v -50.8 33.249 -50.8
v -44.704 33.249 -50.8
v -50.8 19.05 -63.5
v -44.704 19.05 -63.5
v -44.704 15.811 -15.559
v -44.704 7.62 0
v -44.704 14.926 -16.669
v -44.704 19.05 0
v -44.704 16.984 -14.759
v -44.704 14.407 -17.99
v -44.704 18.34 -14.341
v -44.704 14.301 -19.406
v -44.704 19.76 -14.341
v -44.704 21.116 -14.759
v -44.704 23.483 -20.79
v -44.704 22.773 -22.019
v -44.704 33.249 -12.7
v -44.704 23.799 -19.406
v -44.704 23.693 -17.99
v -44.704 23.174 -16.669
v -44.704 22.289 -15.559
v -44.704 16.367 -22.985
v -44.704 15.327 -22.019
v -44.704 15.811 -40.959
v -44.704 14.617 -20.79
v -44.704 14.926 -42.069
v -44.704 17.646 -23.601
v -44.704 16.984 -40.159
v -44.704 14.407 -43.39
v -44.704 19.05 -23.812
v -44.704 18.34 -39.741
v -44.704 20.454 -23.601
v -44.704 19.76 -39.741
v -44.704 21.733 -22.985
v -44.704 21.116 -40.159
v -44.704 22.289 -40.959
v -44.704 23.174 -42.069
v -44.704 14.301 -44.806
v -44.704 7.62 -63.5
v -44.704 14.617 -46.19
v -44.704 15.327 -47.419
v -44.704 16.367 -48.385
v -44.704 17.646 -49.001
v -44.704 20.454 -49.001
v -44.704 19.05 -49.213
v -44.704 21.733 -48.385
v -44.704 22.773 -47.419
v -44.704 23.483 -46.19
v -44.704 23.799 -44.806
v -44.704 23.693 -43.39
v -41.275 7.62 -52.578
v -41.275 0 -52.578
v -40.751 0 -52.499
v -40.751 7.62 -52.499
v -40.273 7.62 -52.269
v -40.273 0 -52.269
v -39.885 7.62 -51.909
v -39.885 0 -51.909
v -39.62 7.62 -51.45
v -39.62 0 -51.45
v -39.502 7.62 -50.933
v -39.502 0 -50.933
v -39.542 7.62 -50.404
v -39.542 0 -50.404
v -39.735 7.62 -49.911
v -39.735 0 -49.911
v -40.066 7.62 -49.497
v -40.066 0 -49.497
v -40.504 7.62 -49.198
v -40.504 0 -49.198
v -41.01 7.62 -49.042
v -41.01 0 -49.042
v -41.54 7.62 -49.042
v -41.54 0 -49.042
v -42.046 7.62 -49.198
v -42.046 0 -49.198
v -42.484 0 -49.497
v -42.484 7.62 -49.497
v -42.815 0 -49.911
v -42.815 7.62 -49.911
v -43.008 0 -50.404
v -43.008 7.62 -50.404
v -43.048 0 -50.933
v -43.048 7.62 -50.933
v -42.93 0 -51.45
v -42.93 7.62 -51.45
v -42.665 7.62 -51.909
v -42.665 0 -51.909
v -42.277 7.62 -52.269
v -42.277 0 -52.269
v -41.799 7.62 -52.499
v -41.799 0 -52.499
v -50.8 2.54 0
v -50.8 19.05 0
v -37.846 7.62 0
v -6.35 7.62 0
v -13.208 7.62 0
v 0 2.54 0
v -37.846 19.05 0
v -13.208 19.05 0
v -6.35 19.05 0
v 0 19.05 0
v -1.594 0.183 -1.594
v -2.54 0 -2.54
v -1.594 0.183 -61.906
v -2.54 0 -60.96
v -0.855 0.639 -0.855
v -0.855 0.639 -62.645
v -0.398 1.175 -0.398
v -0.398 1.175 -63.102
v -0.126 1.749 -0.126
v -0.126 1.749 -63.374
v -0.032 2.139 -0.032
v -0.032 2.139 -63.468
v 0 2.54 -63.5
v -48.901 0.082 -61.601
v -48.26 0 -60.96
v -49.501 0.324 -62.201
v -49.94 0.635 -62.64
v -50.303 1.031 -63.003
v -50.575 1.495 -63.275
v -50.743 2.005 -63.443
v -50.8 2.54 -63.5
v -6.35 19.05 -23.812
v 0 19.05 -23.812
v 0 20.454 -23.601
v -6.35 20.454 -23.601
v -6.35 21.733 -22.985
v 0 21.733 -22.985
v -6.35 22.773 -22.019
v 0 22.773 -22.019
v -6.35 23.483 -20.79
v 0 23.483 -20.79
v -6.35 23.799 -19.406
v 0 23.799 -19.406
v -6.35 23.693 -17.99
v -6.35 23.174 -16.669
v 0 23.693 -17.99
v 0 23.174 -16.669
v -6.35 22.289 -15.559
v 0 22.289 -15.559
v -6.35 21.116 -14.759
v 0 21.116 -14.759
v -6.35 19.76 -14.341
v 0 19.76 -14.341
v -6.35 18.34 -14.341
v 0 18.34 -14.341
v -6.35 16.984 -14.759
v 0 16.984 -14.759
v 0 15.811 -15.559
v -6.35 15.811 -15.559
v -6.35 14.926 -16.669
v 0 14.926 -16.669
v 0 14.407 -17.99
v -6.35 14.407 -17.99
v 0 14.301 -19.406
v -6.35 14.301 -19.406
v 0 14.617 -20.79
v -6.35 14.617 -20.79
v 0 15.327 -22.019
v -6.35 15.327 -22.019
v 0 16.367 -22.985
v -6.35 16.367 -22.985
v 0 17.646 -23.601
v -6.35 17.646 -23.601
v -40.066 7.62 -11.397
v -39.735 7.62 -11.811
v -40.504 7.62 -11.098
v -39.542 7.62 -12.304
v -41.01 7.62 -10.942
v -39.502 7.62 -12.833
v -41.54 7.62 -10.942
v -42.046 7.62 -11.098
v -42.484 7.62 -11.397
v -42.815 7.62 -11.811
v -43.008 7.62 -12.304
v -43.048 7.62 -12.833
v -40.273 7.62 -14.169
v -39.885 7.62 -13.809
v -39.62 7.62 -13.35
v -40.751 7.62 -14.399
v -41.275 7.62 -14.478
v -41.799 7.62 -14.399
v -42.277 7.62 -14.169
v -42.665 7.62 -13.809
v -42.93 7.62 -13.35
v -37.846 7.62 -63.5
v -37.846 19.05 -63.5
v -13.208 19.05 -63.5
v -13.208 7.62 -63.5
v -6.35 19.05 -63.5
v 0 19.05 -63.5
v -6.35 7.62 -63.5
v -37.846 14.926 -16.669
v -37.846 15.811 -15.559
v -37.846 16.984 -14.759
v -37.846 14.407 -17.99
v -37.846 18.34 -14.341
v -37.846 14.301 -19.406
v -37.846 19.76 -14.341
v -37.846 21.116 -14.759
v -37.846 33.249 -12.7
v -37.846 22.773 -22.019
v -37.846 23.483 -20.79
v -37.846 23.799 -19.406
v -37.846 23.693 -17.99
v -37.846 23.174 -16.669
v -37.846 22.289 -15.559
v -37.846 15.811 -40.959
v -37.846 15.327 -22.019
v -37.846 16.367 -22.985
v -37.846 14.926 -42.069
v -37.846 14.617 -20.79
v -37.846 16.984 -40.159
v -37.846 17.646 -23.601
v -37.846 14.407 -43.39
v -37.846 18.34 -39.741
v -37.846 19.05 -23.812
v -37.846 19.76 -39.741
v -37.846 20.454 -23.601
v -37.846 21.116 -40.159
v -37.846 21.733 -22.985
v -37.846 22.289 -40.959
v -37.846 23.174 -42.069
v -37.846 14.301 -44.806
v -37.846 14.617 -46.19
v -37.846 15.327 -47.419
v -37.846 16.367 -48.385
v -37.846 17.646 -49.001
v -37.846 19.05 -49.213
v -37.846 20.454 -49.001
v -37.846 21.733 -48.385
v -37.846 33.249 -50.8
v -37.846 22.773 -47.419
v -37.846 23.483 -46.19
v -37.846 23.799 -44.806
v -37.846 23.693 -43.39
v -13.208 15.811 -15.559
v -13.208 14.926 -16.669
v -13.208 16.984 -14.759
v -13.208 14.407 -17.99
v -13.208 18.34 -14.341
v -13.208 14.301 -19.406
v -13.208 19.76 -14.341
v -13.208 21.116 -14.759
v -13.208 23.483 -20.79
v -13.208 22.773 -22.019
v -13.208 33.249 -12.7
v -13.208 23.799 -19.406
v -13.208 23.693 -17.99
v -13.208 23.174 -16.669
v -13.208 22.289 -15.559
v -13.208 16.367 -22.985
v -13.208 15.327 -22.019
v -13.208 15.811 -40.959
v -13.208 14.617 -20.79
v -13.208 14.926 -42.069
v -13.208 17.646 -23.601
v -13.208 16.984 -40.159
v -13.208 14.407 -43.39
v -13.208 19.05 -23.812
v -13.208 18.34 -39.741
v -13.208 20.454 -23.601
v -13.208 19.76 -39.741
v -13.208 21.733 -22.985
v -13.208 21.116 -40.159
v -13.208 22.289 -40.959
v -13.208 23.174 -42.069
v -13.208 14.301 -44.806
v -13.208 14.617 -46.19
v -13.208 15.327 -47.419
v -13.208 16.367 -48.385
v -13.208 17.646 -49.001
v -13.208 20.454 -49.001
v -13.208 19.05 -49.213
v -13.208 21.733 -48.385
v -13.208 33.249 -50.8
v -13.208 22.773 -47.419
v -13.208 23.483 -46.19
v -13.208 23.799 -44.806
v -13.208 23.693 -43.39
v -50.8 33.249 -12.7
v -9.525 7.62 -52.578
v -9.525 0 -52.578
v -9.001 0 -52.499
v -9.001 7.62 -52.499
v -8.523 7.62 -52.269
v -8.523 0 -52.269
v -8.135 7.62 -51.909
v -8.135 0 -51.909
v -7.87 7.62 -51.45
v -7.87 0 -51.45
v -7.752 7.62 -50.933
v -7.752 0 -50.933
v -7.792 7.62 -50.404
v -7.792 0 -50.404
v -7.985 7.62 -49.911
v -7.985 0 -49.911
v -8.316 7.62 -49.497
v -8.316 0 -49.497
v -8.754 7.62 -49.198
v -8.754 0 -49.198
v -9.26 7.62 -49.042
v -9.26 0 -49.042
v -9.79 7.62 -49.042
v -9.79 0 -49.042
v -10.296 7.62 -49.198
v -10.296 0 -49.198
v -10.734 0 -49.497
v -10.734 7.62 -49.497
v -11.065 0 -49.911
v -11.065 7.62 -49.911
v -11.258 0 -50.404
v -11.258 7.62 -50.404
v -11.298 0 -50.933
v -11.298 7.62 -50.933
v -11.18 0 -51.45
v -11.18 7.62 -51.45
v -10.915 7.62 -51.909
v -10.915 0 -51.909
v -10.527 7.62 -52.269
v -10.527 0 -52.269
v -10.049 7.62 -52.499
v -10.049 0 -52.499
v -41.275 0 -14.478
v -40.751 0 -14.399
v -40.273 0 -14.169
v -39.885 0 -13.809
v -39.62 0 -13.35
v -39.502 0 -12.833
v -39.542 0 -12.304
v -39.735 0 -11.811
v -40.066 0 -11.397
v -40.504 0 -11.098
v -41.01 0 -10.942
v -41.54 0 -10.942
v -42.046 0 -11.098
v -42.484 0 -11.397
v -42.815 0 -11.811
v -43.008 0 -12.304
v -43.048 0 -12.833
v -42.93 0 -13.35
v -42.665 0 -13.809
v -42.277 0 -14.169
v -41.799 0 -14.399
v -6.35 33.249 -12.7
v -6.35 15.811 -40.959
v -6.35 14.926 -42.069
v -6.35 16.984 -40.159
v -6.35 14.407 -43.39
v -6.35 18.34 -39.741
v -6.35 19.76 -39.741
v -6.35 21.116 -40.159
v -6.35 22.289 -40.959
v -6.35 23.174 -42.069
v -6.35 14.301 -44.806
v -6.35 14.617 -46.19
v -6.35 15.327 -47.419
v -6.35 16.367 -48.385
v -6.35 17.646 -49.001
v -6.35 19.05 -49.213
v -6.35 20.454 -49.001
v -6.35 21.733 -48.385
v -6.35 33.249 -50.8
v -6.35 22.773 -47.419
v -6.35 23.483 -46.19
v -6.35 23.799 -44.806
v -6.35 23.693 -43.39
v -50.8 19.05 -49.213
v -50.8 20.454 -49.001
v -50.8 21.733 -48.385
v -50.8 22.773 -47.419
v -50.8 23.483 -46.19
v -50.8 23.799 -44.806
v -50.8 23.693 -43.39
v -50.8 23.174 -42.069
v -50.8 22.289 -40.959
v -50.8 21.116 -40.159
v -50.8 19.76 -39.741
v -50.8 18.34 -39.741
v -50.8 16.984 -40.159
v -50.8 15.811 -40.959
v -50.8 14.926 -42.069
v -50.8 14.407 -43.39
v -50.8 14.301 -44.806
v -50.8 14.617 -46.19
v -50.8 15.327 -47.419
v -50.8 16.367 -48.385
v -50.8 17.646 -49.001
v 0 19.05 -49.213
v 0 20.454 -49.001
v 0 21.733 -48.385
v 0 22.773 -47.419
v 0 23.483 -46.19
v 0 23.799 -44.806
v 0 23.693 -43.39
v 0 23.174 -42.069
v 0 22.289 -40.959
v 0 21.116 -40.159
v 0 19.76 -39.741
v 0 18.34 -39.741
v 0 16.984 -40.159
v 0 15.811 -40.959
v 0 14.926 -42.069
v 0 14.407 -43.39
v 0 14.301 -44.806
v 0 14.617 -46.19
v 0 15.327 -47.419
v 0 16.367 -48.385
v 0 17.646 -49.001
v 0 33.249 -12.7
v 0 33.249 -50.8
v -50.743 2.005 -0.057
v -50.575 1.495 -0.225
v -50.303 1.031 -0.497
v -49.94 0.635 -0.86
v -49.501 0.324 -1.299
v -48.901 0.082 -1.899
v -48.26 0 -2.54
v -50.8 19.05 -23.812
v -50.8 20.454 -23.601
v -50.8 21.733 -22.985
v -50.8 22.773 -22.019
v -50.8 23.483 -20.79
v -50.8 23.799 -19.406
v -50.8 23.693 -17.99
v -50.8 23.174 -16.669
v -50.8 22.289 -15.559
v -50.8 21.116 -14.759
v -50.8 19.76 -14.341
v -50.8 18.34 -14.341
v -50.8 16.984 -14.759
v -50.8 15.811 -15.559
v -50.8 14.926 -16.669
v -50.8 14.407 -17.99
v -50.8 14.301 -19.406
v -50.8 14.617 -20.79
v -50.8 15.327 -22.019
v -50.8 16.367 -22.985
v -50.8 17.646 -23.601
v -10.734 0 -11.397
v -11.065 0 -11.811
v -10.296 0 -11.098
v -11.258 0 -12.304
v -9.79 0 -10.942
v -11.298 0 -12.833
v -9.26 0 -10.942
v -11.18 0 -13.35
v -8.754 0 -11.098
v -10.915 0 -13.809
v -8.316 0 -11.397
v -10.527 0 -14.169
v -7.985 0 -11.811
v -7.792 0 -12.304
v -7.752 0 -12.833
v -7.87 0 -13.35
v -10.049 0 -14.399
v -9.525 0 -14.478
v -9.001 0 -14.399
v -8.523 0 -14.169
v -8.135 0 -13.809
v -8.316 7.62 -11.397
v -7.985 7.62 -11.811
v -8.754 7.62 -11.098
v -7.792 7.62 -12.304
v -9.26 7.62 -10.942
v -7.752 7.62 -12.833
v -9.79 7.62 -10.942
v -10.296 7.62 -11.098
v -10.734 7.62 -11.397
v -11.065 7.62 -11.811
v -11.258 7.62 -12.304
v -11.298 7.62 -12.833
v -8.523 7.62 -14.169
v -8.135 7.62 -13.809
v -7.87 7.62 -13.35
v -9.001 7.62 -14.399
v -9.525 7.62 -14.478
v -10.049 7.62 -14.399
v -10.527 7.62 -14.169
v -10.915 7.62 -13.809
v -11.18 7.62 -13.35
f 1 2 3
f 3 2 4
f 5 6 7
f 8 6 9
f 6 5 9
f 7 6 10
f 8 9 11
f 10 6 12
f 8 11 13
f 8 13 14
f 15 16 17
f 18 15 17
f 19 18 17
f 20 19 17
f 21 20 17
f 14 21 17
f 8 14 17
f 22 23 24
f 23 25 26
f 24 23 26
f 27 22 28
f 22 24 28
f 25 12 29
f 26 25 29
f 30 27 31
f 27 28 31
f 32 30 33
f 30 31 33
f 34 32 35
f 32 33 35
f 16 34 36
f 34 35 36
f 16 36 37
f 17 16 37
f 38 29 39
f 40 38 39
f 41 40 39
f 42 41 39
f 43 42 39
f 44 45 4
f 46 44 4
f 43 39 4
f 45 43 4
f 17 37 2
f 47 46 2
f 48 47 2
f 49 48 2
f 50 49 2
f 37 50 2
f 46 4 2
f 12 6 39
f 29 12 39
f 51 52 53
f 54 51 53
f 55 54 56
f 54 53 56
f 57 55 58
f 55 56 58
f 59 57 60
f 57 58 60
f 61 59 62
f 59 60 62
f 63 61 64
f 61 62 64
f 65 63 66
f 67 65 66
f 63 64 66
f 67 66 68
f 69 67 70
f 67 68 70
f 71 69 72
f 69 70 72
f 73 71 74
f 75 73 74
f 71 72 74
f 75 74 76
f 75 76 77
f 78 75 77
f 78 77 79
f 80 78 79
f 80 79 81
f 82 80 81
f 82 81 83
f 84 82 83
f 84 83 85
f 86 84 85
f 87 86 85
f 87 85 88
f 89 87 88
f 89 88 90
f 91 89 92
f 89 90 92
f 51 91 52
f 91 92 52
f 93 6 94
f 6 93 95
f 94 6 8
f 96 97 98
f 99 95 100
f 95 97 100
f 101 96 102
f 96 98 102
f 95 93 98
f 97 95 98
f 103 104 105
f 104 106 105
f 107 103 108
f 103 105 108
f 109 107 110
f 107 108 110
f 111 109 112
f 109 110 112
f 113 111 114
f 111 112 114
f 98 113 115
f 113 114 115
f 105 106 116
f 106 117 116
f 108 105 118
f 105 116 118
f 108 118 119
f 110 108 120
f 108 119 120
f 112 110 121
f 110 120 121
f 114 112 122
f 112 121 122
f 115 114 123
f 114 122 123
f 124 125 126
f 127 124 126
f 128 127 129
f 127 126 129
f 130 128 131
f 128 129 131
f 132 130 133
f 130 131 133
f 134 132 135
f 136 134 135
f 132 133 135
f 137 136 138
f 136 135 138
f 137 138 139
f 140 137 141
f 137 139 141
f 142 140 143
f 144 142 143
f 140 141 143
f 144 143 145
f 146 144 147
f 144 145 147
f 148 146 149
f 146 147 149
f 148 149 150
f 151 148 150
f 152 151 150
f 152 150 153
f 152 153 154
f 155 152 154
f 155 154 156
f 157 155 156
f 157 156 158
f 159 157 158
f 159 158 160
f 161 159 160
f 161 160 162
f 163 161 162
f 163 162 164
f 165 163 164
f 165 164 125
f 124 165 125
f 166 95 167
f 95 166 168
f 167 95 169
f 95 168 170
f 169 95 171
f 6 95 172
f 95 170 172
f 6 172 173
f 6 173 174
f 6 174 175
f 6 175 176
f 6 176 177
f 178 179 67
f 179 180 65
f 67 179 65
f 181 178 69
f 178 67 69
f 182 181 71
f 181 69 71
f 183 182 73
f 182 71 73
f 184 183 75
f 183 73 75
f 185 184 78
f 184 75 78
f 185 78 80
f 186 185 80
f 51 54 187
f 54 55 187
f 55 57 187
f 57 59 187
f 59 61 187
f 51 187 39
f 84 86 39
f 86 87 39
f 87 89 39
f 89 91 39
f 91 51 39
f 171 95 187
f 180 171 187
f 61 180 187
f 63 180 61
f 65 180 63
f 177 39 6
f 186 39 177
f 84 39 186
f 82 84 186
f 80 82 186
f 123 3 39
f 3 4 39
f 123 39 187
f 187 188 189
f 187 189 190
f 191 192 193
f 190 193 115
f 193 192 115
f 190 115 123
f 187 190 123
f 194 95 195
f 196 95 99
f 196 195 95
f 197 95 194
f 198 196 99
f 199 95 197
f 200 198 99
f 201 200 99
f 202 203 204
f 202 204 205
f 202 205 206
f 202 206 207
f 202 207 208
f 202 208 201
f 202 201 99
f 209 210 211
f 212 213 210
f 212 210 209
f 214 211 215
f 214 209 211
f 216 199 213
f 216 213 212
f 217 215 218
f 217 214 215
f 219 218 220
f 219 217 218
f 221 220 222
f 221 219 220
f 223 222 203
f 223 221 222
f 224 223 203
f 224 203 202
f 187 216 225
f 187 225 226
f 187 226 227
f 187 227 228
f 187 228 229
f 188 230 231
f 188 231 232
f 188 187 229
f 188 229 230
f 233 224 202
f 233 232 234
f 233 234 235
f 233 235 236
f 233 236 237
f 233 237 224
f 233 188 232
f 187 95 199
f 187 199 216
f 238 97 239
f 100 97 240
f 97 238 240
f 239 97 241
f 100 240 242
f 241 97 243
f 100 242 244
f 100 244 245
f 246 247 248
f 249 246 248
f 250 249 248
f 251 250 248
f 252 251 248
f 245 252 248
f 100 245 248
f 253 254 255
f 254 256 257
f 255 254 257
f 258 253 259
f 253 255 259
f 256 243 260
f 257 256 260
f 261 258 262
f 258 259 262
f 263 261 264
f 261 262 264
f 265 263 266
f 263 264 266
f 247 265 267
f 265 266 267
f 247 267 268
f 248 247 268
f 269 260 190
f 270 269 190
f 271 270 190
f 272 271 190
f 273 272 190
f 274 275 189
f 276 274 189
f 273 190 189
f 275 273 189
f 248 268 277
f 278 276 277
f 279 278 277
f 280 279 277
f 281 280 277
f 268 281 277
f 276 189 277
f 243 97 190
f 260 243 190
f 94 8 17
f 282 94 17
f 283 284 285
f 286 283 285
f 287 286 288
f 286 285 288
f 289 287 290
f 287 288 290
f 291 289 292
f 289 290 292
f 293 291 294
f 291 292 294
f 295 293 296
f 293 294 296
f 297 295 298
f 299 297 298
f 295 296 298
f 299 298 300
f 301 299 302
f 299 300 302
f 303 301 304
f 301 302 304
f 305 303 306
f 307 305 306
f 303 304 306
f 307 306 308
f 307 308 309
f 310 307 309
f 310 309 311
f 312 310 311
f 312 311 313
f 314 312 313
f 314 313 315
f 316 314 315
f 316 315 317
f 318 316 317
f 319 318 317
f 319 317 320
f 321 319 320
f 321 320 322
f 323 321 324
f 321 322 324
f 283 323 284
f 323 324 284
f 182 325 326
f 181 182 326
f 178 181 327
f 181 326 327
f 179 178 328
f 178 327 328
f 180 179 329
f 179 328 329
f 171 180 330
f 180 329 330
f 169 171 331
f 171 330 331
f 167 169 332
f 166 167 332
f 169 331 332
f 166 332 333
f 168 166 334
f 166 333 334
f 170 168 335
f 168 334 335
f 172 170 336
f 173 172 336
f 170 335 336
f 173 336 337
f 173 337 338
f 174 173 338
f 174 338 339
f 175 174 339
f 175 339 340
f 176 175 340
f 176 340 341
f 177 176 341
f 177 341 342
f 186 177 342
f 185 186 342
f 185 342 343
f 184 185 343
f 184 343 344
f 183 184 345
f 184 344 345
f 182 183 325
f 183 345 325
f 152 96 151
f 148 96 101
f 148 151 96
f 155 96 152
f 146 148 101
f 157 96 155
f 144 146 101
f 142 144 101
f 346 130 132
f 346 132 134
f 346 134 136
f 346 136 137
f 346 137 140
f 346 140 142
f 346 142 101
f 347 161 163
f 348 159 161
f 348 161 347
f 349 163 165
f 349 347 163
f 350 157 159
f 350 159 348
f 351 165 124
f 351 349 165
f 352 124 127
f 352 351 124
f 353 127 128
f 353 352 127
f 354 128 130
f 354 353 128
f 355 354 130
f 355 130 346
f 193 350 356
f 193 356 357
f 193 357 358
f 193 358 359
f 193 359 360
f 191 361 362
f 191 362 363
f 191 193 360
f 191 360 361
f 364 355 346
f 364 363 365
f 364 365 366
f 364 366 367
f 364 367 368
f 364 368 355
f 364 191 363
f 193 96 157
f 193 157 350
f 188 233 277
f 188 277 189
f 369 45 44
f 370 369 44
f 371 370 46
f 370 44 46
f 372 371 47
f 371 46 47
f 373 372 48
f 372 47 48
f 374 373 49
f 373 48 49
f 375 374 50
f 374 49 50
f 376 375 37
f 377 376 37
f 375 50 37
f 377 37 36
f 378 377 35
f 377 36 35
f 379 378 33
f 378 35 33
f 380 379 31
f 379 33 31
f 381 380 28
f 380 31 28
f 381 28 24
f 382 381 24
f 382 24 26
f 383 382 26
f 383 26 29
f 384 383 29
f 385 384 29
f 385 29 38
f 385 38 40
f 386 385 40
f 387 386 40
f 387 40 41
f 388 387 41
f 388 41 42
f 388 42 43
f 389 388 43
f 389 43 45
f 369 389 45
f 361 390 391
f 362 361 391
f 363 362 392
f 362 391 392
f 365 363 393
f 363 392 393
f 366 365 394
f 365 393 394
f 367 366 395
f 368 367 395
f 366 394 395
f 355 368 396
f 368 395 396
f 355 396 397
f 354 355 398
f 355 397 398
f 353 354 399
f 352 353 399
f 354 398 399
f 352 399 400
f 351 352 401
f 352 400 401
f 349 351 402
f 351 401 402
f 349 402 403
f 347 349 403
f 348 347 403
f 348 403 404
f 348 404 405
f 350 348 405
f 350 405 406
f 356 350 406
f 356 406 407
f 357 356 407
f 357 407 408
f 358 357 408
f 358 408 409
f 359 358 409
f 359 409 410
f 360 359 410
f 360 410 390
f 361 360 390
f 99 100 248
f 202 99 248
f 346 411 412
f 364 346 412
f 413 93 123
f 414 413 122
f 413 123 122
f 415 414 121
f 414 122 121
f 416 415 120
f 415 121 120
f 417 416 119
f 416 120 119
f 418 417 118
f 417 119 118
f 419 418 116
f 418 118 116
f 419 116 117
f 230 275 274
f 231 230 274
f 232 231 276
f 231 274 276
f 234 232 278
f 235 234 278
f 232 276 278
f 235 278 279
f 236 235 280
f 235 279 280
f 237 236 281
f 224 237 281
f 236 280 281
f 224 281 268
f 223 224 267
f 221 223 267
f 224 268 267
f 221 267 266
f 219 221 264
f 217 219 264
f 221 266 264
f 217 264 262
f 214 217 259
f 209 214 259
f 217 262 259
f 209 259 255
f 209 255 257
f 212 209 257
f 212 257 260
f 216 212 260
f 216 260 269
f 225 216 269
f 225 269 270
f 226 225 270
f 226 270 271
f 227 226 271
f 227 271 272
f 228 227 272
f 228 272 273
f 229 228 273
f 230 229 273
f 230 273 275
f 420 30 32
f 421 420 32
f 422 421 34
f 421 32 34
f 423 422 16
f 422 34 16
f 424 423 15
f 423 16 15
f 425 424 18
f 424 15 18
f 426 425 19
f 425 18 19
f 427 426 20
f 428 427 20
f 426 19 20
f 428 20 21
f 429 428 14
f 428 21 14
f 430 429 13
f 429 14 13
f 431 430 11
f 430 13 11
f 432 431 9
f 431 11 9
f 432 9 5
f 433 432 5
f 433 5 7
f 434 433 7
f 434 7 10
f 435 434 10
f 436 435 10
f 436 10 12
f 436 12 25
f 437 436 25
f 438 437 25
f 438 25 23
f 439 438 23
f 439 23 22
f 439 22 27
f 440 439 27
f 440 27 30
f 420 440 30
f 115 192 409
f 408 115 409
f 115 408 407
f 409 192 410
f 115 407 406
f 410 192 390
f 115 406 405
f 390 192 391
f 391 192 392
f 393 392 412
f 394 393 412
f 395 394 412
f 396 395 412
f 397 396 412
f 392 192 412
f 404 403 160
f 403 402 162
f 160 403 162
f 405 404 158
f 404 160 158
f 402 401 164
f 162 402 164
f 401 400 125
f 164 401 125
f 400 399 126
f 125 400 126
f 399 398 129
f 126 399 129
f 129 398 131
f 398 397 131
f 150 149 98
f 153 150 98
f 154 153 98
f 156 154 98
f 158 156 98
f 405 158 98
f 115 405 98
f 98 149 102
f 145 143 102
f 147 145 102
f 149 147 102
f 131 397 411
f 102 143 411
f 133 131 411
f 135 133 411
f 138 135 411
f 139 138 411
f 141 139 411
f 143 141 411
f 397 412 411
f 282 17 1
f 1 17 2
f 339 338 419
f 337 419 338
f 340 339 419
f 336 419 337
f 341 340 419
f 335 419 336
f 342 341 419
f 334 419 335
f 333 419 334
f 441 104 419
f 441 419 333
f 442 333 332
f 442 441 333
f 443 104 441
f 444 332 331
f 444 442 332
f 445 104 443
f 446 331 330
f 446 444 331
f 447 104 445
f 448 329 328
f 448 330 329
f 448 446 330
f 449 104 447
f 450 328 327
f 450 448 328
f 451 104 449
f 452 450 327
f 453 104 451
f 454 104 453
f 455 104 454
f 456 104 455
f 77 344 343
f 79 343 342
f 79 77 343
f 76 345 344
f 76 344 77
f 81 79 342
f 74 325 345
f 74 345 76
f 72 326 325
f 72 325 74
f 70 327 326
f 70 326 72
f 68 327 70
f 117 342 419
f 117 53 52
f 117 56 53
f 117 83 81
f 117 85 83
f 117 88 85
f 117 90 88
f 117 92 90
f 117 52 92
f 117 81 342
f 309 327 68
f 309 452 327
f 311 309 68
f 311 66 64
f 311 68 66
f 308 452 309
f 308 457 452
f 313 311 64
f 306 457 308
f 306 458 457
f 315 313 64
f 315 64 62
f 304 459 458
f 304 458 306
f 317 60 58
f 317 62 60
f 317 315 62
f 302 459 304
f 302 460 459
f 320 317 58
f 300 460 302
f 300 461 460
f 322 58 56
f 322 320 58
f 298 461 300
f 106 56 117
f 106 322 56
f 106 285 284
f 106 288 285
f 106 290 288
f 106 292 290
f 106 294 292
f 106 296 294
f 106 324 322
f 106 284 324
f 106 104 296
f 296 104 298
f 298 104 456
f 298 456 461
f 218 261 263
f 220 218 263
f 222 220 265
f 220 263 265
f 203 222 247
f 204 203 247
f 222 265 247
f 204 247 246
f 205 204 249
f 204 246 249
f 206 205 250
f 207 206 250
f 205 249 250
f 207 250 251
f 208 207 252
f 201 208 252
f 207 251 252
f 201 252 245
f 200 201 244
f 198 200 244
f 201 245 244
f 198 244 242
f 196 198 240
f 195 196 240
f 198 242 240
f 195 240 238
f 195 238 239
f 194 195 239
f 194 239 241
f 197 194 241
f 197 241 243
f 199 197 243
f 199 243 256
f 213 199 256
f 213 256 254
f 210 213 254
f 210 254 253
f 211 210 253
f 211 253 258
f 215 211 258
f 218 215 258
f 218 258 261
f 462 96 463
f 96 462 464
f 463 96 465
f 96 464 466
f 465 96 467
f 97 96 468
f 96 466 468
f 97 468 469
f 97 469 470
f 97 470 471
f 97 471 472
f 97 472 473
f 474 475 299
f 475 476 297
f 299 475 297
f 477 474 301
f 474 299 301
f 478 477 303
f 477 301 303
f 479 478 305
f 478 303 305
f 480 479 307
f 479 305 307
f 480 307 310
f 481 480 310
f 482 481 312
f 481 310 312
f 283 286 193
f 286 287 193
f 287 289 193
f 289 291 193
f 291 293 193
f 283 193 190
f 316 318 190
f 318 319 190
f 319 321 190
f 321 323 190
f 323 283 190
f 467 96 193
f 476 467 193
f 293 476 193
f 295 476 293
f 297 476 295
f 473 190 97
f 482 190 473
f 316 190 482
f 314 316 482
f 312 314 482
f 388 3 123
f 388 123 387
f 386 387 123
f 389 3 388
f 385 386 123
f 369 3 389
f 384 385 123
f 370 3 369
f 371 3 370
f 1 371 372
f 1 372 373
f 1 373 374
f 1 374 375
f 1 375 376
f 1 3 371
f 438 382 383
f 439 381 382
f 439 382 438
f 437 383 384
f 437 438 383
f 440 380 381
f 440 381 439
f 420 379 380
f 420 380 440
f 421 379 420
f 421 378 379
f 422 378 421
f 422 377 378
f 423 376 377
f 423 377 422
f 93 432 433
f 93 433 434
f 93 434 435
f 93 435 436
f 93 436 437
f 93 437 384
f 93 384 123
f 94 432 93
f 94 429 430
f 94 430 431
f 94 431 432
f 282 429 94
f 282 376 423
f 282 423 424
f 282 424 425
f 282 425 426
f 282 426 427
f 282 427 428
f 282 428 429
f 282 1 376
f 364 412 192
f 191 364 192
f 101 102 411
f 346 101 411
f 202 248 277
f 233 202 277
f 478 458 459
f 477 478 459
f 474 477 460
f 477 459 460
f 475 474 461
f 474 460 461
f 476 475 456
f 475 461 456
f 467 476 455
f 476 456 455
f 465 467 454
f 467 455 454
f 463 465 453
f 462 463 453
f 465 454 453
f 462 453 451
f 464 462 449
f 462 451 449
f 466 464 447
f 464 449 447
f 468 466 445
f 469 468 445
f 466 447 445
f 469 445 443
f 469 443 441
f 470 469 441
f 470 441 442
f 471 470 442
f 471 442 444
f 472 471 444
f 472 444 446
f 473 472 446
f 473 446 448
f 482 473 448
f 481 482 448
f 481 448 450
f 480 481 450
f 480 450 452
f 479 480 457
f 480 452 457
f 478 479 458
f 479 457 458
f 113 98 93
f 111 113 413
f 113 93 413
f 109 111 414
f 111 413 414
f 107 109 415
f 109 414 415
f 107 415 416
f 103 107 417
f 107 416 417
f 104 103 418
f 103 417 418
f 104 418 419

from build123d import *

# Parameters (mm, degrees)
SKETCH1_W           = 63.5
SKETCH1_H           = 6.35
BOSS_EXTRUDE1_DEPTH = 50.8
BOSS_EXTRUDE2_DEPTH = 50.8
SKETCH10_W          = 6.858
SKETCH10_H          = 25.629031657
CUT_EXTRUDE1_DEPTH  = 88.854357354
LPATTERN3_COUNT     = 2
LPATTERN3_PITCH     = 31.496
SKETCH11_R          = 4.7625
CUT_EXTRUDE2_DEPTH  = 88.854357354
FILLET1_R           = 2.54
SKETCH19_R          = 1.778
CUT_EXTRUDE3_DEPTH  = 7.62


with BuildPart() as part:
    # Sketch1 → Boss-Extrude1 (new body)
    with BuildSketch(Plane(origin=(0, 0, 0), x_dir=(0, 0, -1), z_dir=(1, 0, 0))):
        with Locations((31.75, 3.175)):
            Rectangle(SKETCH1_W, SKETCH1_H)
    extrude(amount=-BOSS_EXTRUDE1_DEPTH)

    # Sketch2 → Boss-Extrude2 (add)
    with BuildSketch(Plane(origin=(0, 0, 0), x_dir=(0, 0, -1), z_dir=(1, 0, 0))):
        Polygon((0, 6.35), (0, 19.05), (12.7, 33.249031657), (50.8, 33.249031657), (63.5, 19.05), (63.5, 6.35), align=None)
    extrude(amount=-BOSS_EXTRUDE2_DEPTH)

    # Sketch10 → Cut-Extrude1 (cut, through all)
    with BuildSketch(Plane(origin=(0, 0, -63.5), x_dir=(-1, 0, 0), z_dir=(0, 0, -1))):
        with Locations((9.779, 20.434515829)):
            Rectangle(SKETCH10_W, SKETCH10_H)
    cut_extrude1 = extrude(amount=-CUT_EXTRUDE1_DEPTH, mode=Mode.SUBTRACT)

    # LPattern3: Cut-Extrude1 ×2
    with Locations(*[(-i * LPATTERN3_PITCH, 0, 0) for i in range(1, LPATTERN3_COUNT)]):
        add(cut_extrude1, mode=Mode.SUBTRACT)

    # Sketch11 → Cut-Extrude2 (cut, through all)
    with BuildSketch(Plane(origin=(0, 0, 0), x_dir=(0, 0, -1), z_dir=(1, 0, 0))):
        with Locations((19.05, 19.05)):
            Circle(SKETCH11_R)
        with Locations((44.45, 19.05)):
            Circle(SKETCH11_R)
    extrude(amount=-CUT_EXTRUDE2_DEPTH, mode=Mode.SUBTRACT)

    # Fillet1
    fillet1_edges = [part.edges().sort_by_distance(p)[0] for p in [
        (0, 0, -31.75),
        (-50.8, 0, -31.75),
        (-25.4, 0, -63.5),
        (-25.4, 0, 0),
    ]]
    fillet(fillet1_edges, radius=FILLET1_R)

    # Sketch19 → Cut-Extrude3 (cut)
    with BuildSketch(Plane.XZ):
        with Locations(Location((-9.525, -50.8, 0), (0, 0, 270))):
            Circle(SKETCH19_R)
        with Locations(Location((-41.275, -50.8, 0), (0, 0, 270))):
            Circle(SKETCH19_R)
        with Locations(Location((-41.275, -12.7, 0), (0, 0, 270))):
            Circle(SKETCH19_R)
        with Locations(Location((-9.525, -12.7, 0), (0, 0, 270))):
            Circle(SKETCH19_R)
    extrude(amount=-CUT_EXTRUDE3_DEPTH, mode=Mode.SUBTRACT)


solid = part.part
